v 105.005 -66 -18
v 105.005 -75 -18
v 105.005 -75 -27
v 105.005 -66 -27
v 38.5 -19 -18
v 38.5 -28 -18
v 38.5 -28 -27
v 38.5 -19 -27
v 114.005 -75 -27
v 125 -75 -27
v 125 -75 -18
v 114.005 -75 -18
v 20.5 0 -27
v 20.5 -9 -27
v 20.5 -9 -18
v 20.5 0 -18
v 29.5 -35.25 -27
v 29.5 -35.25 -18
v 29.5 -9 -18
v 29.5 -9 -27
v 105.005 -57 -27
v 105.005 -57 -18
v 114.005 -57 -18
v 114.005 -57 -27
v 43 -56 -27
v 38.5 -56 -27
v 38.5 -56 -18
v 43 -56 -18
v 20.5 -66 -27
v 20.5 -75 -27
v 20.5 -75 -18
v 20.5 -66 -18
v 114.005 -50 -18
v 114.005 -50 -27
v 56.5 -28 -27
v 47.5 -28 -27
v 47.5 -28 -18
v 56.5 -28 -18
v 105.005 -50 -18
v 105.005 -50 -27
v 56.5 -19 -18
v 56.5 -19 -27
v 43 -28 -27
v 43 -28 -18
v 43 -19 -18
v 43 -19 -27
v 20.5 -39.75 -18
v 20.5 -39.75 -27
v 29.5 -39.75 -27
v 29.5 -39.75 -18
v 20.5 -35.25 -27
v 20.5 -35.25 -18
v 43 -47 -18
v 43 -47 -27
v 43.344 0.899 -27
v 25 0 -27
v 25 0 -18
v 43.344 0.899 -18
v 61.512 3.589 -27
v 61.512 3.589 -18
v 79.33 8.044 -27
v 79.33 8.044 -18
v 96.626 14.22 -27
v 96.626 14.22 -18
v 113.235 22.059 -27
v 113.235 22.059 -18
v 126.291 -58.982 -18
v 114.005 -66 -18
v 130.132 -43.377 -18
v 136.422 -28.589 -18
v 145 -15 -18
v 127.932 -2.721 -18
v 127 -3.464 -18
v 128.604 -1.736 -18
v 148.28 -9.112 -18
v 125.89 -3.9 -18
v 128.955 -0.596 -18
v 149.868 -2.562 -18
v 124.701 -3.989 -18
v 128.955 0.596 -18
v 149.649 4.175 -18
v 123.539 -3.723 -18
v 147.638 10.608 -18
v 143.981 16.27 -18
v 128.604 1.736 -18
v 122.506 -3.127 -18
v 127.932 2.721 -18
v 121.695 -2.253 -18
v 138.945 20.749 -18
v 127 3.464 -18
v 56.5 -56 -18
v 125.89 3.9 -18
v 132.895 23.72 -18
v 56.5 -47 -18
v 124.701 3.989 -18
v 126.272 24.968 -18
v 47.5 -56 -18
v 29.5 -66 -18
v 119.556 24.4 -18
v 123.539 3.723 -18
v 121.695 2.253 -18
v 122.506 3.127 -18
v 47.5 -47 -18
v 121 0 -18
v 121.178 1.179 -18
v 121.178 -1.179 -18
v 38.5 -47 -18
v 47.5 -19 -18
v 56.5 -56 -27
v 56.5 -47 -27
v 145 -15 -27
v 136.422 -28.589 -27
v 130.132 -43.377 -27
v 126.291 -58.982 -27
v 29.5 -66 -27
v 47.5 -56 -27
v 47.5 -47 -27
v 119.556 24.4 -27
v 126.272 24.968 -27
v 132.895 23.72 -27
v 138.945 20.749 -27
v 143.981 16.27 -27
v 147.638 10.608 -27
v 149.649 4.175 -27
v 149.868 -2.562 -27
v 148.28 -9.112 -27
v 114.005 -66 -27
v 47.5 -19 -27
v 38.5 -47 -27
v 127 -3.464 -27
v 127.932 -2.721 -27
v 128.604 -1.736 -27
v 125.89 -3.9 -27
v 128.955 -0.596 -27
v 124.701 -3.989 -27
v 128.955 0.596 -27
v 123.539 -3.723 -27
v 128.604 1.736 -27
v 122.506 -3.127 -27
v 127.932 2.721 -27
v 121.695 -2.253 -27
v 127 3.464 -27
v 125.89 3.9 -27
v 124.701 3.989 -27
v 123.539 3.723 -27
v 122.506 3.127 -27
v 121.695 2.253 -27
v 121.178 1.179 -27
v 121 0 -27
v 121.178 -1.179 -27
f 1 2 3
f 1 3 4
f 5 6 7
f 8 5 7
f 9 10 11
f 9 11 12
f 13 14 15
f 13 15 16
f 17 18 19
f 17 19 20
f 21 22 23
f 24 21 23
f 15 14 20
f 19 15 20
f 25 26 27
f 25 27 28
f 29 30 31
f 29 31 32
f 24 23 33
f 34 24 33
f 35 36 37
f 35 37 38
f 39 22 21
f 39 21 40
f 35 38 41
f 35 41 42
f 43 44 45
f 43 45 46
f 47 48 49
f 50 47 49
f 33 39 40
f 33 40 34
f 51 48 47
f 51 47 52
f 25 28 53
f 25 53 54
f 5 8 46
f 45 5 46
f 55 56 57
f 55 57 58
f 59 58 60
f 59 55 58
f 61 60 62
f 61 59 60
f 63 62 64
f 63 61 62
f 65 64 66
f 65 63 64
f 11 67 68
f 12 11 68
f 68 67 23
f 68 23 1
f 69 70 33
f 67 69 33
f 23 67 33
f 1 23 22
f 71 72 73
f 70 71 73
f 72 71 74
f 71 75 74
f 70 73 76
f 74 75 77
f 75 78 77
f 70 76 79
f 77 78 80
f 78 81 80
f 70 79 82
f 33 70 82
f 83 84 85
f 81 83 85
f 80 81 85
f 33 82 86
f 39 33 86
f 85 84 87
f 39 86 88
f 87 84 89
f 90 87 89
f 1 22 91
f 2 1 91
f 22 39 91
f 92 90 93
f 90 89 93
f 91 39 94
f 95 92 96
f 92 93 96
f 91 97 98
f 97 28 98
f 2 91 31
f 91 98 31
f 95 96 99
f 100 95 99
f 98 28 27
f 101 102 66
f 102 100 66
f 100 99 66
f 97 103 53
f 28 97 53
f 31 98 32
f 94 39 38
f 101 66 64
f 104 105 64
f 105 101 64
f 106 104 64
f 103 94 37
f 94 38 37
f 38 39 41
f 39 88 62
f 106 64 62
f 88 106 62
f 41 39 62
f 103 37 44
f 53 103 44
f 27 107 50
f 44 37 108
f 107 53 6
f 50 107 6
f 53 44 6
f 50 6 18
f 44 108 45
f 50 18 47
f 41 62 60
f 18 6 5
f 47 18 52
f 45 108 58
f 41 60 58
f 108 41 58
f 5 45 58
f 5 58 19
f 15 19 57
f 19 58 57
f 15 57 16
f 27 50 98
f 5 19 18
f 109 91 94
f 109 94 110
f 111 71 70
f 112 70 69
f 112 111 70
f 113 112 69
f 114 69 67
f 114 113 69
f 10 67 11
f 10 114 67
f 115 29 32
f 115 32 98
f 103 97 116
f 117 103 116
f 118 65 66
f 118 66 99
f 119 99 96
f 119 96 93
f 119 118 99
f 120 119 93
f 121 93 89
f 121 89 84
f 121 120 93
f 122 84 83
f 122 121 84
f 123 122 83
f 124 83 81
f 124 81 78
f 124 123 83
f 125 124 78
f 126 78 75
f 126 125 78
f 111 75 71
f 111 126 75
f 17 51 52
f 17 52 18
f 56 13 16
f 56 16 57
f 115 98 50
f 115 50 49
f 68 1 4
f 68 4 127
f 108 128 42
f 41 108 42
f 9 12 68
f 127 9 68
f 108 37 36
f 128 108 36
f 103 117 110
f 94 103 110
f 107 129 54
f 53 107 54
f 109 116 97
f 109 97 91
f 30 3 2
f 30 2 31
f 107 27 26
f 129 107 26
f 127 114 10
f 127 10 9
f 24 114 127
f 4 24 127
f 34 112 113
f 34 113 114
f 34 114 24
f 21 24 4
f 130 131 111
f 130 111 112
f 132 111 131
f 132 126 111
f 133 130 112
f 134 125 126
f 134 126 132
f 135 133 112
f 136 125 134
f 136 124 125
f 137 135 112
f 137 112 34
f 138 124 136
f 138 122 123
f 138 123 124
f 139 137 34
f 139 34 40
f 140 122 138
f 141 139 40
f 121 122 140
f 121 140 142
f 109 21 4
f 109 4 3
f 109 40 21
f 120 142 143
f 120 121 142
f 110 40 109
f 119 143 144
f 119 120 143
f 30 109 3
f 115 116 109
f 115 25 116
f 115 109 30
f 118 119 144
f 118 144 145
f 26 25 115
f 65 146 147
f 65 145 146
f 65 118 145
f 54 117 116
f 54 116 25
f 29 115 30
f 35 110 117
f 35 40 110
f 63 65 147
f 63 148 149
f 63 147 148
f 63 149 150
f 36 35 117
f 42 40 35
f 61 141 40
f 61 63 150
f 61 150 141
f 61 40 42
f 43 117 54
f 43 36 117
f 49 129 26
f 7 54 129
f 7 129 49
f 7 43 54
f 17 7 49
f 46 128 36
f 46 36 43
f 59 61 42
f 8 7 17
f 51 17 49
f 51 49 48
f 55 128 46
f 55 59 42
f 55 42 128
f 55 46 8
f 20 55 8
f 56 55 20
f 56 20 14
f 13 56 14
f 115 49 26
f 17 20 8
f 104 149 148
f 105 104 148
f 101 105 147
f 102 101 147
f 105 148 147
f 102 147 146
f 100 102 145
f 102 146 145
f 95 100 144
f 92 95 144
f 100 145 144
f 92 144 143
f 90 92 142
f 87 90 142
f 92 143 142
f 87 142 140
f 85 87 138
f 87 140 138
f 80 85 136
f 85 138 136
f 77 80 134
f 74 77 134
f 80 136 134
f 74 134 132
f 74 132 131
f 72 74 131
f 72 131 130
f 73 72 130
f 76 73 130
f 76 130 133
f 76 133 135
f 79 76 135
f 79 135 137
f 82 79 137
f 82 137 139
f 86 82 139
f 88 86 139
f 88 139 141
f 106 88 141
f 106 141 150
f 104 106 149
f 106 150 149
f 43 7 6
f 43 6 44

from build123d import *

# Parameters (mm, degrees)
SKETCH1_R                = 8
SKETCH1_R_2              = 4
BOSS_EXTRUDE1_DEPTH      = 9
BOSS_EXTRUDE1_2_DEPTH    = 9
SKETCH2_R                = 4
BOSS_EXTRUDE3_DEPTH      = 9
FILLET1_R                = 1
CUT_EXTRUDE1_DEPTH       = 214.789616212
SKETCH4_W                = 9
SKETCH4_H                = 27
BOSS_EXTRUDE4_DEPTH      = 75
BOSS_EXTRUDE5_START      = 9
SKETCH5_R                = 25
SKETCH5_R_2              = 4
BOSS_EXTRUDE5_DEPTH      = 9
BOSS_EXTRUDE6_DEPTH      = 4.5
BOSS_EXTRUDE6_DEPTH_BACK = 4.5
BOSS_EXTRUDE7_DEPTH      = 4.5
BOSS_EXTRUDE7_DEPTH_BACK = 4.5
BOSS_EXTRUDE7_START      = -25
SKETCH9_W                = 9
SKETCH9_H                = 7
SKETCH9_H_2              = 9
CUT_EXTRUDE2_DEPTH       = 217.612557346
CUT_EXTRUDE3_DEPTH       = 216.299790989
CUT_EXTRUDE3_DEPTH_BACK  = 216.299790989
CAVITY1_START            = -66
CAVITY1_OUTLINE_W        = 9
CAVITY1_OUTLINE_H        = 9
CAVITY1_DEPTH            = 26.25
CAVITY1_START_2          = -35.25
CAVITY1_2_OUTLINE_W      = 9
CAVITY1_2_OUTLINE_H      = 9
CAVITY1_2_DEPTH          = 26.25
CAVITY1_START_3          = -56
CAVITY1_3_OUTLINE_W      = 9
CAVITY1_3_OUTLINE_H      = 9
CAVITY1_3_OUTLINE_W_2    = 4.5
CAVITY1_3_DEPTH          = 9
CAVITY1_START_4          = -28
CAVITY1_4_OUTLINE_W      = 9
CAVITY1_4_OUTLINE_H      = 9
CAVITY1_4_OUTLINE_W_2    = 4.5
CAVITY1_4_DEPTH          = 9


# Read off the part's stored shape, not the designer's step: Cavity1
with BuildPart() as part:
    # Sketch1 → Boss-Extrude1 (new body)
    with BuildSketch(Plane.XY):
        with Locations((-125, 0)):
            Circle(SKETCH1_R)
        with Locations((-125, 0)):
            Circle(SKETCH1_R_2, mode=Mode.SUBTRACT)
    extrude(amount=BOSS_EXTRUDE1_DEPTH)



with BuildPart() as body_2:
    # Sketch1 → Boss-Extrude1 2 (new body)
    with BuildSketch(Plane.XY):
        with Locations((125, 0)):
            Circle(SKETCH1_R)
        with Locations((125, 0)):
            Circle(SKETCH1_R_2, mode=Mode.SUBTRACT)
    extrude(amount=BOSS_EXTRUDE1_2_DEPTH)


with BuildPart() as part_1:
    add(part.part)

    add(body_2.part)  # Boss-Extrude3 merges body 2
    # Sketch2 → Boss-Extrude3 (add)
    with BuildSketch(Plane.XY):
        with BuildLine():
            Line((-175, -75), (125, -75))
            ThreePointArc((125, -75), (130.131670325, -43.377223009), (145.000000492, -14.999999344))
            ThreePointArc((145.000000492, -14.999999344), (143.981414944, 16.269784471), (113.235294528, 22.058823748))
            ThreePointArc((113.235294528, 22.058823748), (25.000000075, 0), (-63.235294395, 22.058823677))
            ThreePointArc((-63.235294395, 22.058823677), (-75.420498385, 24.996463372), (-87.499999896, 21.650635154))
            ThreePointArc((-87.499999896, 21.650635154), (-99.999999954, 18.301270189), (-112.500000024, 21.650635108))
            ThreePointArc((-112.500000024, 21.650635108), (-124.99999995, 25), (-137.49999989, 21.650635158))
            ThreePointArc((-137.49999989, 21.650635158), (-149.999999954, 18.301270189), (-162.50000003, 21.650635112))
            ThreePointArc((-162.50000003, 21.650635112), (-193.705072901, 16.586749162), (-195.000000551, -14.999999265))
            ThreePointArc((-195.000000551, -14.999999265), (-180.13167034, -43.377222962), (-175, -75))
        make_face()
        with Locations((125, 0)):
            Circle(SKETCH2_R, mode=Mode.SUBTRACT)
        with Locations((-175, 0)):
            Circle(SKETCH2_R, mode=Mode.SUBTRACT)
        with Locations((-125, 0)):
            Circle(SKETCH2_R, mode=Mode.SUBTRACT)
        with Locations((-75, 0)):
            Circle(SKETCH2_R, mode=Mode.SUBTRACT)
    extrude(amount=BOSS_EXTRUDE3_DEPTH)

    # Fillet1
    fillet1_edges = [part_1.edges().sort_by_distance(p)[0] for p in [
        (-175, -75, 4.5),
        (125, -75, 4.5),
    ]]
    fillet(fillet1_edges, radius=FILLET1_R)

    # Sketch3 → Cut-Extrude1 (cut, through all)
    with BuildSketch(Plane.XY):
        Polygon((25, 0), (25, -75), (150, -75), (150, 25), (25, 25), align=None)
    extrude(amount=CUT_EXTRUDE1_DEPTH, mode=Mode.SUBTRACT)

    # Sketch4 → Boss-Extrude4 (add)
    with BuildSketch(Plane.XZ.offset(75)):
        with Locations((25, -4.5)):
            Rectangle(SKETCH4_W, SKETCH4_H)
    extrude(amount=-BOSS_EXTRUDE4_DEPTH)

    # Sketch5 → Boss-Extrude5 (add)
    # profile 1 of 4: a face of its own
    with BuildSketch(Plane(origin=(0, 0, -18), x_dir=(-1, 0, 0), z_dir=(0, 0, -1)).offset(BOSS_EXTRUDE5_START)):
        with BuildLine():
            ThreePointArc((-145.000000304, -14.999999594), (-130.131670275, -43.377223158), (-125, -75))
            Line((-125, -75), (-29.5, -75))
            Line((-29.5, -75), (-29.5, 0))
            Line((-29.5, 0), (-100, 0))
            ThreePointArc((-100, 0), (-117.09430609, -23.717082532), (-145.000000304, -14.999999594))
        make_face()
    # profile 2 of 4: a face of its own
    with BuildSketch(Plane(origin=(0, 0, -18), x_dir=(-1, 0, 0), z_dir=(0, 0, -1)).offset(BOSS_EXTRUDE5_START)):
        with Locations((-125, 0)):
            Circle(SKETCH5_R)
        with Locations((-125, 0)):
            Circle(SKETCH5_R_2, mode=Mode.SUBTRACT)
    # profile 3 of 4: a face of its own
    with BuildSketch(Plane(origin=(0, 0, -18), x_dir=(-1, 0, 0), z_dir=(0, 0, -1)).offset(BOSS_EXTRUDE5_START)):
        Polygon((-29.5, 0), (-29.5, -75), (-20.5, -75), (-20.5, 0), (-25, 0), align=None)
    # profile 4 of 4: a face of its own
    with BuildSketch(Plane(origin=(0, 0, -18), x_dir=(-1, 0, 0), z_dir=(0, 0, -1)).offset(BOSS_EXTRUDE5_START)):
        with BuildLine():
            Line((-100, 0), (-29.5, 0))
            Line((-29.5, 0), (-25, 0))
            ThreePointArc((-25, 0), (-70.475429529, 5.598281181), (-113.235293817, 22.058823369))
            ThreePointArc((-113.235293817, 22.058823369), (-103.56267677, 12.86239374), (-100, 0))
        make_face()
    extrude(amount=-BOSS_EXTRUDE5_DEPTH)

    # Sketch7 → Boss-Extrude6 (add, two sides: drawn at the far end of the back side and taken through both)
    with BuildSketch(Plane(origin=(0, -25, 0), x_dir=(1, 0, 0), z_dir=(0, 1, 0)).offset(-BOSS_EXTRUDE6_DEPTH_BACK)):
        with BuildLine():
            Line((56.5, 18), (29.5, 18))
            Line((29.5, 18), (29.5, -9))
            ThreePointArc((29.5, -9), (48.591883092, -1.091883092), (56.5, 18))
        make_face()
        with BuildLine():
            Line((-6.5, 0), (20.5, 0))
            Line((20.5, 0), (20.5, 27))
            ThreePointArc((20.5, 27), (1.408116908, 19.091883092), (-6.5, 0))
        make_face()
    extrude(amount=BOSS_EXTRUDE6_DEPTH + BOSS_EXTRUDE6_DEPTH_BACK)

    # Sketch7<3> → Boss-Extrude7 (add, two sides: drawn at the far end of the back side and taken through both)
    with BuildSketch(Plane(origin=(0, -25, 0), x_dir=(1, 0, 0), z_dir=(0, 1, 0)).offset(BOSS_EXTRUDE7_START - BOSS_EXTRUDE7_DEPTH_BACK)):
        with BuildLine():
            Line((56.5, 18), (29.5, 18))
            Line((29.5, 18), (29.5, -9))
            ThreePointArc((29.5, -9), (48.591883092, -1.091883092), (56.5, 18))
        make_face()
        with BuildLine():
            Line((-6.5, 0), (20.5, 0))
            Line((20.5, 0), (20.5, 27))
            ThreePointArc((20.5, 27), (1.408116908, 19.091883092), (-6.5, 0))
        make_face()
    extrude(amount=BOSS_EXTRUDE7_DEPTH + BOSS_EXTRUDE7_DEPTH_BACK)

    # Sketch9 → Cut-Extrude2 (cut, through all)
    with BuildSketch(Plane.XY.offset(9)):
        with Locations((-160.208548161, -53.5)):
            Rectangle(SKETCH9_W, SKETCH9_H)
        with Locations((-160.208548161, -70.5)):
            Rectangle(SKETCH9_W, SKETCH9_H_2)
        with Locations((-25.351798772, -53.5)):
            Rectangle(SKETCH9_W, SKETCH9_H)
        with Locations((-25.351798772, -70.5)):
            Rectangle(SKETCH9_W, SKETCH9_H_2)
        with Locations((109.504950616, -53.5)):
            Rectangle(SKETCH9_W, SKETCH9_H)
        with Locations((109.504950616, -70.5)):
            Rectangle(SKETCH9_W, SKETCH9_H_2)
    extrude(amount=-CUT_EXTRUDE2_DEPTH, mode=Mode.SUBTRACT)

    # Sketch10 → Cut-Extrude3 (cut, two sides: drawn at the far end of the back side and taken through both)
    with BuildSketch(Plane(origin=(0, 0, 0), x_dir=(1, 0, 0), z_dir=(0, 1, 0)).offset(-CUT_EXTRUDE3_DEPTH_BACK)):
        Polygon((-200, 27), (-200, 0), (25, 0), (25, -9), (150, -9), (150, 18), (20.5, 18), (20.5, 27), align=None)
    extrude(amount=CUT_EXTRUDE3_DEPTH + CUT_EXTRUDE3_DEPTH_BACK, mode=Mode.SUBTRACT)


with BuildPart() as cut_extrude3_kept_piece:
    # of the separate pieces the step leaves, the one the design keeps (cut_extrude3_pieces_kept)
    add(part_1.part.solids().sort_by_distance((20.5, 0, -27))[0])

    # Cavity1 outline → Cavity1 (cut)
    with BuildSketch(Plane(origin=(0, 0, 0), x_dir=(1, 0, 0), z_dir=(0, 1, 0)).offset(CAVITY1_START)):
        with Locations((25, 22.5)):
            Rectangle(CAVITY1_OUTLINE_W, CAVITY1_OUTLINE_H)
    extrude(amount=CAVITY1_DEPTH, mode=Mode.SUBTRACT)

    # Cavity1 2 outline → Cavity1 2 (cut)
    with BuildSketch(Plane(origin=(0, 0, 0), x_dir=(1, 0, 0), z_dir=(0, 1, 0)).offset(CAVITY1_START_2)):
        with Locations((25, 22.5)):
            Rectangle(CAVITY1_2_OUTLINE_W, CAVITY1_2_OUTLINE_H)
    extrude(amount=CAVITY1_2_DEPTH, mode=Mode.SUBTRACT)

    # Cavity1 3 outline → Cavity1 3 (cut)
    with BuildSketch(Plane(origin=(0, 0, 0), x_dir=(1, 0, 0), z_dir=(0, 1, 0)).offset(CAVITY1_START_3)):
        with Locations((52, 22.5)):
            Rectangle(CAVITY1_3_OUTLINE_W, CAVITY1_3_OUTLINE_H)
        with Locations((40.75, 22.5)):
            Rectangle(CAVITY1_3_OUTLINE_W_2, CAVITY1_3_OUTLINE_H)
    extrude(amount=CAVITY1_3_DEPTH, mode=Mode.SUBTRACT)

    # Cavity1 4 outline → Cavity1 4 (cut)
    with BuildSketch(Plane(origin=(0, 0, 0), x_dir=(1, 0, 0), z_dir=(0, 1, 0)).offset(CAVITY1_START_4)):
        with Locations((52, 22.5)):
            Rectangle(CAVITY1_4_OUTLINE_W, CAVITY1_4_OUTLINE_H)
        with Locations((40.75, 22.5)):
            Rectangle(CAVITY1_4_OUTLINE_W_2, CAVITY1_4_OUTLINE_H)
    extrude(amount=CAVITY1_4_DEPTH, mode=Mode.SUBTRACT)


solid = cut_extrude3_kept_piece.part
